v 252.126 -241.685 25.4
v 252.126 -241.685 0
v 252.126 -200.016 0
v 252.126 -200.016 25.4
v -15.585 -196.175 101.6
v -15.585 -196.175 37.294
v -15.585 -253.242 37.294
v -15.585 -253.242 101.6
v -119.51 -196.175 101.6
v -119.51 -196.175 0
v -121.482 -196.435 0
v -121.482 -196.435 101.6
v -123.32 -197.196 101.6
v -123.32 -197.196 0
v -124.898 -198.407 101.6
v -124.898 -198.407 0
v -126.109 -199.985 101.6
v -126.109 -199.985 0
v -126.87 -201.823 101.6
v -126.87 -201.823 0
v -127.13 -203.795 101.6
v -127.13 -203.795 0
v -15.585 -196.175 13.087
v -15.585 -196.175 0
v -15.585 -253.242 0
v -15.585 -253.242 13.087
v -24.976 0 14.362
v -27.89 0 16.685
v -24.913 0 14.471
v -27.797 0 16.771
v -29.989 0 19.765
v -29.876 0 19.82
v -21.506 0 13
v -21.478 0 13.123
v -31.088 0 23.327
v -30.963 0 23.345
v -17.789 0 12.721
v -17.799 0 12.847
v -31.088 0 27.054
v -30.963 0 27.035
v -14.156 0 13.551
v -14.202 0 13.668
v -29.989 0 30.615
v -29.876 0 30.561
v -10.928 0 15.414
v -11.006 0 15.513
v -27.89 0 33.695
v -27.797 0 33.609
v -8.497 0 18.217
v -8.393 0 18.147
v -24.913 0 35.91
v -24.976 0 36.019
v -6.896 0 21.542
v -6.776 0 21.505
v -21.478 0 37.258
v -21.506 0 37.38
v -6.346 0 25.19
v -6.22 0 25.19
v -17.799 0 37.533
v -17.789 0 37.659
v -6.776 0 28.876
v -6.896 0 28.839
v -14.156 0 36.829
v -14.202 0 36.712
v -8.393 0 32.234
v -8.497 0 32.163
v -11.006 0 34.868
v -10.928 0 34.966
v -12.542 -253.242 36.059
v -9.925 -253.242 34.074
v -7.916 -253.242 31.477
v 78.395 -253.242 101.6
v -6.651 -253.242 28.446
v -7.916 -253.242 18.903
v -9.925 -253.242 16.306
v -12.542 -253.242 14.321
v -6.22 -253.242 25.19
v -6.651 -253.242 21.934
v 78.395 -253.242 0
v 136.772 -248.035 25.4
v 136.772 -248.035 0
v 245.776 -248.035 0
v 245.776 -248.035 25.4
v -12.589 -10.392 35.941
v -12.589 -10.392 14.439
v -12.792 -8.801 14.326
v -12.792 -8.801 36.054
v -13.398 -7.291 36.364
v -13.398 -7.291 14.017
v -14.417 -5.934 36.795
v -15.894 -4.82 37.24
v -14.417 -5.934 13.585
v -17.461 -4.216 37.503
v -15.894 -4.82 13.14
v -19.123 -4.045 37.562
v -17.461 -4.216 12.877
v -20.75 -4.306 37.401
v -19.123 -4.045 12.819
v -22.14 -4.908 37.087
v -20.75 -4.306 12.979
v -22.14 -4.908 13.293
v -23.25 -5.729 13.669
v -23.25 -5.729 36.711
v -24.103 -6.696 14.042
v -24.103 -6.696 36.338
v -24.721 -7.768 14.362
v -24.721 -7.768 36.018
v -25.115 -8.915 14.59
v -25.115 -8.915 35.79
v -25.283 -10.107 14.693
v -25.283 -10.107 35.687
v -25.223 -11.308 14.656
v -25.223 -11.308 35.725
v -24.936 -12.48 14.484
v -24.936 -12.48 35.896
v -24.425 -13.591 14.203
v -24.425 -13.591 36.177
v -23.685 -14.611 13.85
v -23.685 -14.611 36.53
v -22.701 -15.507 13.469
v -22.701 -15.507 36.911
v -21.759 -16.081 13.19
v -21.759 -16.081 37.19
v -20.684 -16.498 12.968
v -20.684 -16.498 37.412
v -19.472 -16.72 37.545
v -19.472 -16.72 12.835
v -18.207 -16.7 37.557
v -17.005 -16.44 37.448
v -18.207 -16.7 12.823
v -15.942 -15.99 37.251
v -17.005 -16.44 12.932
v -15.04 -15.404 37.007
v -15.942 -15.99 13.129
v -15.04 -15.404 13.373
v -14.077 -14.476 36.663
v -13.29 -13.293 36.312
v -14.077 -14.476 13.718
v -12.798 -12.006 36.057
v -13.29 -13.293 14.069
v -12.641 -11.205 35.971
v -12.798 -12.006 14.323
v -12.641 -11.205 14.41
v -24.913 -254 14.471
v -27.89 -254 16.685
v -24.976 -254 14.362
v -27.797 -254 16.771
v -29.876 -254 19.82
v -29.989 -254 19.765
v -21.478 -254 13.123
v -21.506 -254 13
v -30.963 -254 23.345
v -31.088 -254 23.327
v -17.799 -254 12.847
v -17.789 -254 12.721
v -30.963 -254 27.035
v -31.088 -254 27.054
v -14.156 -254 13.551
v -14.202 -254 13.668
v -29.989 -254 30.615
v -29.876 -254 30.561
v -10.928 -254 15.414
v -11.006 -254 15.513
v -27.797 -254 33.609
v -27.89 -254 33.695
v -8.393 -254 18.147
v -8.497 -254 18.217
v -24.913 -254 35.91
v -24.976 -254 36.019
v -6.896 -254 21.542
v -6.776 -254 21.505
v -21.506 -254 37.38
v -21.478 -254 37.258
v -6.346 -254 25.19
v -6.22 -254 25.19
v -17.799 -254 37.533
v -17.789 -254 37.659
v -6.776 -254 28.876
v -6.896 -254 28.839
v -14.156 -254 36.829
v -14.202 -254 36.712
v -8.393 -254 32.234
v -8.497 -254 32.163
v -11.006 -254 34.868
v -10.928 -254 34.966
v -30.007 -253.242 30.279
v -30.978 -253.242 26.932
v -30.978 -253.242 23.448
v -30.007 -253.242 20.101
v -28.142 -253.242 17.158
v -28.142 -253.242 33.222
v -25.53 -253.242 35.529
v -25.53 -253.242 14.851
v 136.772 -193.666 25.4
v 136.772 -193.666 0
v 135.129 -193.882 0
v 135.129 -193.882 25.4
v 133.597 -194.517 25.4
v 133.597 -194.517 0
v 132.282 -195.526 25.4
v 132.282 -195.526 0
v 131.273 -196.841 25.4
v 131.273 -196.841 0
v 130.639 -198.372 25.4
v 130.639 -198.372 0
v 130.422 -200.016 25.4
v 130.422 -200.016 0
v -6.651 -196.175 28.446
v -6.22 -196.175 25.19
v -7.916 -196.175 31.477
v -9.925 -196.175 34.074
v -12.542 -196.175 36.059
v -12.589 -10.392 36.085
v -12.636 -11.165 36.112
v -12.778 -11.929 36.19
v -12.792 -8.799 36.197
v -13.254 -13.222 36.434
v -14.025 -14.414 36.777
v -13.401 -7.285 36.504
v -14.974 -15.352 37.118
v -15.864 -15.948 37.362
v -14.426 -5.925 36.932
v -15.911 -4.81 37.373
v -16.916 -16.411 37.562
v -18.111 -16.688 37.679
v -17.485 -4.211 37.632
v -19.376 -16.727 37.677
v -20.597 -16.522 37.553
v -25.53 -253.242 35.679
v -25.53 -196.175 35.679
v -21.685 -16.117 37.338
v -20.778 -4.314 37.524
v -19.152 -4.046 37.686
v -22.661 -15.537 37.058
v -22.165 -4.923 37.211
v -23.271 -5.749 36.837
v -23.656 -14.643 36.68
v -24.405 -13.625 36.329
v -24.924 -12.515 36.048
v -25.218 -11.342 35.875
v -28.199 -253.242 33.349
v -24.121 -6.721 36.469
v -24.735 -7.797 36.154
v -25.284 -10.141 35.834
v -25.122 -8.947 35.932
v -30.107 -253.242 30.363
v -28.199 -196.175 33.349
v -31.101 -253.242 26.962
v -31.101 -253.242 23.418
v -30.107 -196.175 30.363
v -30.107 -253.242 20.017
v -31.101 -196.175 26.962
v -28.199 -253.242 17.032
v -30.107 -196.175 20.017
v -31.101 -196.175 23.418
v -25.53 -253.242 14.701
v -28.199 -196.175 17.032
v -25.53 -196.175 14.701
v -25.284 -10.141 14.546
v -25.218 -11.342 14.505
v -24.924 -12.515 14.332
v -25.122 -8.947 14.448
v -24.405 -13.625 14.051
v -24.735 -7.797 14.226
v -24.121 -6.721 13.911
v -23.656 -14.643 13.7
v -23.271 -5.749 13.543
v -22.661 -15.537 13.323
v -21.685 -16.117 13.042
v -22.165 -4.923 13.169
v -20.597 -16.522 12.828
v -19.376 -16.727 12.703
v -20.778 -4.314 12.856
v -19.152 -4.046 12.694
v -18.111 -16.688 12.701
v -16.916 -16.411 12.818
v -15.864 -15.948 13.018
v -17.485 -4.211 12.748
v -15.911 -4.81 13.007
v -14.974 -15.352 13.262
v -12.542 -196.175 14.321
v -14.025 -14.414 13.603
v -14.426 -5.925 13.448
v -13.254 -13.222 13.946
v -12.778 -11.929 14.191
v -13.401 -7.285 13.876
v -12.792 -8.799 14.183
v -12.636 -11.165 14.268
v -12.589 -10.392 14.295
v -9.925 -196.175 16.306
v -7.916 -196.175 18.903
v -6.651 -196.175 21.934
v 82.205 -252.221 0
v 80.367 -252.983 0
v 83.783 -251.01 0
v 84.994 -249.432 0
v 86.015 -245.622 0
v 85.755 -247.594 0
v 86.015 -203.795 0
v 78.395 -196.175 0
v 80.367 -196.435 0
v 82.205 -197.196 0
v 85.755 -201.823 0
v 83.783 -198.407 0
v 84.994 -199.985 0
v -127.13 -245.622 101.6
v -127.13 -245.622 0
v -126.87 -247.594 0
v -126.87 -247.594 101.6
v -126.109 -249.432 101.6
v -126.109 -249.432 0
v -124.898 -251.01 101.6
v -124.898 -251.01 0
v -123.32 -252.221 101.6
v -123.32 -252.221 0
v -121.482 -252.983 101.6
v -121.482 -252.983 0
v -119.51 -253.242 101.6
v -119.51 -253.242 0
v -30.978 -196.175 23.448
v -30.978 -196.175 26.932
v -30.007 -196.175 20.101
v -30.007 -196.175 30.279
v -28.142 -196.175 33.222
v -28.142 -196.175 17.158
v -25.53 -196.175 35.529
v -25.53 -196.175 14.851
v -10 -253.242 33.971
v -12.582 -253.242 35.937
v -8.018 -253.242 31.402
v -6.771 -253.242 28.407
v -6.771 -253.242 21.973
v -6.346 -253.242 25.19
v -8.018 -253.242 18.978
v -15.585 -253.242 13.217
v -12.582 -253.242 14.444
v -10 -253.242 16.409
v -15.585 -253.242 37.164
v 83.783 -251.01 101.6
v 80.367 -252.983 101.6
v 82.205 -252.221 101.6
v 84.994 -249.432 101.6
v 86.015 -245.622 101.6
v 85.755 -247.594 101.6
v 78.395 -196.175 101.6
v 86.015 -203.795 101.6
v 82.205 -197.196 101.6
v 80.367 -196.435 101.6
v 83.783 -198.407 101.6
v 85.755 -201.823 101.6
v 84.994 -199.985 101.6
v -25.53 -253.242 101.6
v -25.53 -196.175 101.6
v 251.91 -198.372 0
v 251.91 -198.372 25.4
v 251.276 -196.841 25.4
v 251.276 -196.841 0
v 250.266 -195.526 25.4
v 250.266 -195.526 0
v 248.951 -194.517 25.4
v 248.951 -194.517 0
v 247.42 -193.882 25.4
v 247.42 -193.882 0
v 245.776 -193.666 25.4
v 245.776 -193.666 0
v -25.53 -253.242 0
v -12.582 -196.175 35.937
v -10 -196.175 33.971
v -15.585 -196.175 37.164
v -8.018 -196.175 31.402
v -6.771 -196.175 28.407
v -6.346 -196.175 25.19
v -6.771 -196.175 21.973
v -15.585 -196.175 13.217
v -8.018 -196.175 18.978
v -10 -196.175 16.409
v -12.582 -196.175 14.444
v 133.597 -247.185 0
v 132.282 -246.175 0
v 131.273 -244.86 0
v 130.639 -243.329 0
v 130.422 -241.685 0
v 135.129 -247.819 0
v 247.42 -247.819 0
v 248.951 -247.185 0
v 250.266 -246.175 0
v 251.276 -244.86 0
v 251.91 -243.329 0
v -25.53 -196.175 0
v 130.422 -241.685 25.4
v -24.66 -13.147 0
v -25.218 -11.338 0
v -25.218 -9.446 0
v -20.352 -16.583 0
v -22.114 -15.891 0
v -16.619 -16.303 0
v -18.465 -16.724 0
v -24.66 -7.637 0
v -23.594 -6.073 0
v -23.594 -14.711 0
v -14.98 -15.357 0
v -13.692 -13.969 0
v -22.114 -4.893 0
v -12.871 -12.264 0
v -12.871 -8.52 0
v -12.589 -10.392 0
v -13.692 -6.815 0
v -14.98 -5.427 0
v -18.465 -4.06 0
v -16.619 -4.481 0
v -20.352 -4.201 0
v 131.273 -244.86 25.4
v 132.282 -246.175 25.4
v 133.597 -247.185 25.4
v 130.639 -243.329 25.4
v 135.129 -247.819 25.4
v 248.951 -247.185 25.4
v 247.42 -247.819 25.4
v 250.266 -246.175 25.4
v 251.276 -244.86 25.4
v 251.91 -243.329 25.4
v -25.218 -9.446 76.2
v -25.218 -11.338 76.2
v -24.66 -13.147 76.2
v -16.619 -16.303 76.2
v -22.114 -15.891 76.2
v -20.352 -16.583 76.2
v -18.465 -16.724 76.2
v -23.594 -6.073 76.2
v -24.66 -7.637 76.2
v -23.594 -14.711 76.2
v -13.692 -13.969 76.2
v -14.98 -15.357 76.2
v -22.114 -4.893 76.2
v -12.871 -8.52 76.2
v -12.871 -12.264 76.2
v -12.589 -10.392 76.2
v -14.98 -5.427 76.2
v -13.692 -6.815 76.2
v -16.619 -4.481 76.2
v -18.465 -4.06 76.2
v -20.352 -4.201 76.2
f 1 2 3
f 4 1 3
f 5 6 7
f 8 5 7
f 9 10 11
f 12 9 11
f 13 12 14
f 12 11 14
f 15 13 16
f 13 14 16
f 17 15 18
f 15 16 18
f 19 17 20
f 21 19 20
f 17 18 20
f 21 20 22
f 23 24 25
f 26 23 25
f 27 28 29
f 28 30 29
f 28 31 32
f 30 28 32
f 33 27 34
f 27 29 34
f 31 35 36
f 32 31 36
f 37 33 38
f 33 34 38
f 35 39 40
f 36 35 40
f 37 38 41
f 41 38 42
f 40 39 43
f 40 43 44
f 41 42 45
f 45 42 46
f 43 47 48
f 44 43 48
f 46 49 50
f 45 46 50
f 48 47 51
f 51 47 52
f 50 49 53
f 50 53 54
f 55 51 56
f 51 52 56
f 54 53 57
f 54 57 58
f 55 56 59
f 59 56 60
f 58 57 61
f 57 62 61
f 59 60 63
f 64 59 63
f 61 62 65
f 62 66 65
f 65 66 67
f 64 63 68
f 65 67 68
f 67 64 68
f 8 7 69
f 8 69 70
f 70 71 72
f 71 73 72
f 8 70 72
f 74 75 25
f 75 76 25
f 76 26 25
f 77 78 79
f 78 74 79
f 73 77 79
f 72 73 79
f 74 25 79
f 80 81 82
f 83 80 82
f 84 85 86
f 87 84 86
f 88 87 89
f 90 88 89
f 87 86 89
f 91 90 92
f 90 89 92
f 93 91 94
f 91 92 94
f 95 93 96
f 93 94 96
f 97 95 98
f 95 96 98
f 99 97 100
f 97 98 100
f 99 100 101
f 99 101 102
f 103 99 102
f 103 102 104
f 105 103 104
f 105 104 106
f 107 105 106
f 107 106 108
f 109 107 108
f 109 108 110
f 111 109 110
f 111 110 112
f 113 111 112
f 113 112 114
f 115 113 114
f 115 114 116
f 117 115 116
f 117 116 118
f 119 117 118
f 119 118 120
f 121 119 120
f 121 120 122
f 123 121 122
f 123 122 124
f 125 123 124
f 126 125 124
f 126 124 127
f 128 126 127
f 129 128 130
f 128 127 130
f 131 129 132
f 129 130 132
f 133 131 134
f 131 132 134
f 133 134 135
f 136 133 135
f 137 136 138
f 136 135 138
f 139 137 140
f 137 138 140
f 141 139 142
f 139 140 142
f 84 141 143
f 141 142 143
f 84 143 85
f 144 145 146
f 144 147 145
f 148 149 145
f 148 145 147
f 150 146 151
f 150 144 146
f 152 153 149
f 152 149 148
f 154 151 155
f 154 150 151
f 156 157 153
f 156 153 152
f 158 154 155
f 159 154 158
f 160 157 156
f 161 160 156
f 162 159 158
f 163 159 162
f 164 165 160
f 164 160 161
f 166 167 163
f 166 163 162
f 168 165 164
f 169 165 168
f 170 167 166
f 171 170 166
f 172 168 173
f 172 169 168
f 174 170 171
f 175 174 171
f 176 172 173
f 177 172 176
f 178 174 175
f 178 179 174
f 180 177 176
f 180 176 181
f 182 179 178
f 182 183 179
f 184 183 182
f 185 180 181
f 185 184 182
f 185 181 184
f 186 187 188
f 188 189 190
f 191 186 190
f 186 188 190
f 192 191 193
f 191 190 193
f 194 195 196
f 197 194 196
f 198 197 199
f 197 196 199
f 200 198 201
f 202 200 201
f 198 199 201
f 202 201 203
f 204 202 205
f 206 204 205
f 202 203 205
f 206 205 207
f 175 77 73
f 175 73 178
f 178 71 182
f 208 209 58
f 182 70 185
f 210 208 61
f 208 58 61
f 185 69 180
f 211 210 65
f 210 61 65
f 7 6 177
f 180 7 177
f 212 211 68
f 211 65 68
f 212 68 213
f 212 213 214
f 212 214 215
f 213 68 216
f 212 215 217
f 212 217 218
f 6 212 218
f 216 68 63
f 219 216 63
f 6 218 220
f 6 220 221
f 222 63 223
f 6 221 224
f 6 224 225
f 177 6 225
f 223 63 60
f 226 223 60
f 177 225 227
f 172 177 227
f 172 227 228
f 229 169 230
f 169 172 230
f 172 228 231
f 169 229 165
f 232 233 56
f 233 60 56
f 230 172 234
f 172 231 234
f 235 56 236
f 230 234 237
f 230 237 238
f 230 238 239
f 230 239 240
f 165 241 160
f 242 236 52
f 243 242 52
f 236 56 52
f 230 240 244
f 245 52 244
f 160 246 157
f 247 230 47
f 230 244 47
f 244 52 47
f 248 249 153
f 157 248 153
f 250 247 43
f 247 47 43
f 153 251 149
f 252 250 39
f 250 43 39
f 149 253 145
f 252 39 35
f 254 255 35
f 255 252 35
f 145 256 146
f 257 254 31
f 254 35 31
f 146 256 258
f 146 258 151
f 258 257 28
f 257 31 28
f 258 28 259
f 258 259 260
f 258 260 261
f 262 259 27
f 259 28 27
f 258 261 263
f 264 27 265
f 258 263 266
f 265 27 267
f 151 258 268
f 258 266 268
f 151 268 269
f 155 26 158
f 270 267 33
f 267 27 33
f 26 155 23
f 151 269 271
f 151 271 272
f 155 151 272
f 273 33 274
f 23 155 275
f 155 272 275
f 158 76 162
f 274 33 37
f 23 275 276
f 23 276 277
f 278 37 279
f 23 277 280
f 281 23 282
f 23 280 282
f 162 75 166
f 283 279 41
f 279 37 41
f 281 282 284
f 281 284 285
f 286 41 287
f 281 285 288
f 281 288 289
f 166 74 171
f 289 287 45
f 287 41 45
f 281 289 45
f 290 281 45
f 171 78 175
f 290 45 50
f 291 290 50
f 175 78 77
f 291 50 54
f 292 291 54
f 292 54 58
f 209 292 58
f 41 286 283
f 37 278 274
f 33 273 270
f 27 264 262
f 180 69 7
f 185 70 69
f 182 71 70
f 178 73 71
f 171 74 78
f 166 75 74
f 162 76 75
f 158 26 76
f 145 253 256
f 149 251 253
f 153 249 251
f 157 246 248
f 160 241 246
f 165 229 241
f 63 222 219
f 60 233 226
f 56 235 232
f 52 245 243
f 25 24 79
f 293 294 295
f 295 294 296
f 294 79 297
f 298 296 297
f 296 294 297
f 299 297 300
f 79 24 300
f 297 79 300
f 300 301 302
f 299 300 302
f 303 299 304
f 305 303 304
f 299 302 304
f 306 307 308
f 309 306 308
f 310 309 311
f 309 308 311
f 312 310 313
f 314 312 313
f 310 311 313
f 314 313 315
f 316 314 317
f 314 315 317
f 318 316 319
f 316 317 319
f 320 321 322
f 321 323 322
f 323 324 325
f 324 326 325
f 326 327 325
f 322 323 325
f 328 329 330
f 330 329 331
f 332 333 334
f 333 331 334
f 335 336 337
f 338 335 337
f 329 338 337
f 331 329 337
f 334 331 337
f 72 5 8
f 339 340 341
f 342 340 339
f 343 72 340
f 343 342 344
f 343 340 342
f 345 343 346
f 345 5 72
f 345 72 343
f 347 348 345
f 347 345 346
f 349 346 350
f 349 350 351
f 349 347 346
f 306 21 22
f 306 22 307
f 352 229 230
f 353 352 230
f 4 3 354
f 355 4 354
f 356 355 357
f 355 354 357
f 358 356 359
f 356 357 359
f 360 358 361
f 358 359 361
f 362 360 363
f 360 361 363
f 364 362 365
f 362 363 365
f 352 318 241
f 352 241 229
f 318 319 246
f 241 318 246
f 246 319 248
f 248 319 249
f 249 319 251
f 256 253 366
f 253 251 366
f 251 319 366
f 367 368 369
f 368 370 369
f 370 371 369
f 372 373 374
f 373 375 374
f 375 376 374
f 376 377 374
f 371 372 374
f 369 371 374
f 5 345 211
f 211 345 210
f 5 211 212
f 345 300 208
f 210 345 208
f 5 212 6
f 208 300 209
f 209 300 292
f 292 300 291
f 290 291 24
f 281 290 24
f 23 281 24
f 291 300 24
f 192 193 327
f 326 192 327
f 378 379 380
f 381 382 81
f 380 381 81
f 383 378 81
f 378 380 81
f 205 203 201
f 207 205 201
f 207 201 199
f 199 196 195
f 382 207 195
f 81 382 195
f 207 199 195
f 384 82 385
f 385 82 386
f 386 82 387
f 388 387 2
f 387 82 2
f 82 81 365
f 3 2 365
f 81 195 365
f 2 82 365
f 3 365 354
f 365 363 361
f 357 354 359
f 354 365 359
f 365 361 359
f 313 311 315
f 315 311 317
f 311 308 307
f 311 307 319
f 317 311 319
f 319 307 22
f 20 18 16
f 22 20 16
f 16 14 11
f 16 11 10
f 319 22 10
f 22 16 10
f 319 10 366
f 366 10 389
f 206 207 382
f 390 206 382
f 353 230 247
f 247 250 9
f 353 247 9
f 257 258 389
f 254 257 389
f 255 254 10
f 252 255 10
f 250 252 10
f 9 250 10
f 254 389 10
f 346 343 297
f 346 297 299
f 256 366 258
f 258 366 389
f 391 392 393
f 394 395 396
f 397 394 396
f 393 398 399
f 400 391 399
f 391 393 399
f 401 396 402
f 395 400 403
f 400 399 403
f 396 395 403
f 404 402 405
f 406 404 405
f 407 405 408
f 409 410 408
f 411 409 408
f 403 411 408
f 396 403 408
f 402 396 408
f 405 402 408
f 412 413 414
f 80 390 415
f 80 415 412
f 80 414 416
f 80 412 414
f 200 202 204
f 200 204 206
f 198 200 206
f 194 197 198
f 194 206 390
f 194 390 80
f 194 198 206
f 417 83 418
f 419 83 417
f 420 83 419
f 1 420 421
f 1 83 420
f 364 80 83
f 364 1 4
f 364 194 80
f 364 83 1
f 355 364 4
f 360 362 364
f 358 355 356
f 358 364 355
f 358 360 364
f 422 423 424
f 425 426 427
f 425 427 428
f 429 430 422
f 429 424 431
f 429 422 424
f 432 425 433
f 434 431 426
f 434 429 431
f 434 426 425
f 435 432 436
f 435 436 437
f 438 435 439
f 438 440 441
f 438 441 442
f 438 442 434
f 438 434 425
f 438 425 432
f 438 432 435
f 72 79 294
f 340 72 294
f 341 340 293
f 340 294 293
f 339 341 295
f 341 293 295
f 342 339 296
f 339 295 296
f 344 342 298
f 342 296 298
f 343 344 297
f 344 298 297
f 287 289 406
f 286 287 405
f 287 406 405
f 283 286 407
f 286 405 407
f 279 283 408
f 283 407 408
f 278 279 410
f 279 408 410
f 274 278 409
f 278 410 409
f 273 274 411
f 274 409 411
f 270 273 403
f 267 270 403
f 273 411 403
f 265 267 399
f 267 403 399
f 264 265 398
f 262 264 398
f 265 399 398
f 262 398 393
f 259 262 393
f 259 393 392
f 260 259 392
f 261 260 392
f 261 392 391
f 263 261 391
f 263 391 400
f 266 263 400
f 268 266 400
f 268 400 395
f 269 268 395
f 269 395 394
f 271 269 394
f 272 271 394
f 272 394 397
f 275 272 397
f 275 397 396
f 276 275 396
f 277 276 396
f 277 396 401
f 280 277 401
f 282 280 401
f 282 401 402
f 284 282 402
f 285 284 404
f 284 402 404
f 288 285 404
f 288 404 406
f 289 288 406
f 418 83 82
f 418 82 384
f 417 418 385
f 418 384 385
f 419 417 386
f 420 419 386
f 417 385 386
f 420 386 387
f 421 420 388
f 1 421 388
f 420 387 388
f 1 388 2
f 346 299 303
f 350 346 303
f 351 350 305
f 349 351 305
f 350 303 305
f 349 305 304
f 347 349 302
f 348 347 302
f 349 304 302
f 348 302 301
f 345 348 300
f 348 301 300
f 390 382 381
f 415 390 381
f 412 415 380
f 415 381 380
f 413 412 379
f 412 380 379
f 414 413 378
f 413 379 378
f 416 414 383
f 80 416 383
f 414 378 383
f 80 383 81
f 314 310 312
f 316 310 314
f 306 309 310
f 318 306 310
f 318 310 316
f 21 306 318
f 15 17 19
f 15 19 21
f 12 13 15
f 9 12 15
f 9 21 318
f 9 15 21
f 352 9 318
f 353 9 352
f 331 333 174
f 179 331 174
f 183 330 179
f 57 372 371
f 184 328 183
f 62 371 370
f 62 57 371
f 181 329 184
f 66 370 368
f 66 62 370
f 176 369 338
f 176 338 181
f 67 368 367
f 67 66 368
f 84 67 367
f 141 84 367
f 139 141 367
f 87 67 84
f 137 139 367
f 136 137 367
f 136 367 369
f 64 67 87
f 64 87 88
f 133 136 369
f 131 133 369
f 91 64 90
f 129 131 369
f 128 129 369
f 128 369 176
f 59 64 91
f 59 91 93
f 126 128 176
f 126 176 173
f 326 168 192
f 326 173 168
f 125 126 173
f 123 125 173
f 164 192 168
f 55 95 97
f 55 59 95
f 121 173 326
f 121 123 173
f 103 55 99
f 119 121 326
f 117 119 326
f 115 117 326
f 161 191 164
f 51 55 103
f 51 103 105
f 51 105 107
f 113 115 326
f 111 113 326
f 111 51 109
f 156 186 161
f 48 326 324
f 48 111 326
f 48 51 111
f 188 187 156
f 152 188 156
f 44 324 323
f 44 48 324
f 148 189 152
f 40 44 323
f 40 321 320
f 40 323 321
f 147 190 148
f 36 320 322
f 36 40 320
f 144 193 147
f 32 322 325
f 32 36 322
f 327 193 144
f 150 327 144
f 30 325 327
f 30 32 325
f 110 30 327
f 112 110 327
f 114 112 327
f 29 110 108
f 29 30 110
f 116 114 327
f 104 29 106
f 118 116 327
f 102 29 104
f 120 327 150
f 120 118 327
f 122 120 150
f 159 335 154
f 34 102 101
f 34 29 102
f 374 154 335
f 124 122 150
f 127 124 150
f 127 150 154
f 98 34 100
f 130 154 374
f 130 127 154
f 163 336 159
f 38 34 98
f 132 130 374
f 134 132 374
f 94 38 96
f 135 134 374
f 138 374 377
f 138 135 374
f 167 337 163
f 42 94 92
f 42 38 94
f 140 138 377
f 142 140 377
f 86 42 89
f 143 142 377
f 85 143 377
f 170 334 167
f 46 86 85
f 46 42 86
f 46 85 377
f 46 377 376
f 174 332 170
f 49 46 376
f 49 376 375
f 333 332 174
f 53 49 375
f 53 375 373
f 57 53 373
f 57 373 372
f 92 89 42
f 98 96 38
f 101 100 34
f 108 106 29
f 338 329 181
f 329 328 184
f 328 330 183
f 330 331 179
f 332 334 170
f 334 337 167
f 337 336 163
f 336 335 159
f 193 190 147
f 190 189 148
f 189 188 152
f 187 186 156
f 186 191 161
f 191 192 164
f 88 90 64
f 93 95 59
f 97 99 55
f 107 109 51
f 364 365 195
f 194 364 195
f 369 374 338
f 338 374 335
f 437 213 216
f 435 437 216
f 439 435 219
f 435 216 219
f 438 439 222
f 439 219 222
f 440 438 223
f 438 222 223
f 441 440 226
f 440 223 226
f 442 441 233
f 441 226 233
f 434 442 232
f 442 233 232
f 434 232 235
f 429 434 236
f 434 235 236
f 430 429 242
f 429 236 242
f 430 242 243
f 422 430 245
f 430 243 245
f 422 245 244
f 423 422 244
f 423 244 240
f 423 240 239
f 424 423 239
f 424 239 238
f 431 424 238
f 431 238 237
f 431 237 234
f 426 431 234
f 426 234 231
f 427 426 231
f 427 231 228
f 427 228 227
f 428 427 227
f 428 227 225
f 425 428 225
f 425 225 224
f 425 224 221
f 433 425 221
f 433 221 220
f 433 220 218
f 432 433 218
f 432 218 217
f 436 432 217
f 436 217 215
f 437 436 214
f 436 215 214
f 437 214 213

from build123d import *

# Parameters (mm, degrees)
F0_R     = 12.5036687166
F0_R_2   = 12.3778800523
F1_DEPTH = 254
F3_DEPTH = 101.6
F4_R     = 6.35
F5_DEPTH = 76.2
F6_W     = 25.5638659
F6_H     = 27.1847397089
F7_DEPTH = 25.4


with BuildPart() as f1:
    # F0 (on Front) → F1 (new body)
    with BuildSketch(Plane.XZ):
        with Locations((-18.7236908823, 25.1901205629)):
            Circle(F0_R)
        with Locations((-18.7236908823, 25.1901205629)):
            Circle(F0_R_2, mode=Mode.SUBTRACT)
    extrude(amount=F1_DEPTH)

    # F2 (on Top) → F3 (join)
    with BuildSketch(Plane.XY):
        with BuildLine():
            Line((-25.5296746087, -253.2422840595), (-25.5296746087, -196.175172925))
            Line((-25.5296746087, -196.175172925), (-119.5096746087, -196.175172925))
            ThreePointArc((-119.5096746087, -196.175172925), (-124.8978282813, -198.4070192524), (-127.1296746087, -203.795172925))
            Line((-127.1296746087, -203.795172925), (-127.1296746087, -245.6222840595))
            ThreePointArc((-127.1296746087, -245.6222840595), (-124.8978282813, -251.0104377322), (-119.5096746087, -253.2422840595))
            Line((-119.5096746087, -253.2422840595), (-25.5296746087, -253.2422840595))
        make_face()
        with BuildLine():
            Line((-15.5854386449, -253.2422840595), (78.3945613551, -253.2422840595))
            ThreePointArc((78.3945613551, -253.2422840595), (83.7827150278, -251.0104377322), (86.0145613551, -245.6222840595))
            Line((86.0145613551, -245.6222840595), (86.0145613551, -203.795172925))
            ThreePointArc((86.0145613551, -203.795172925), (83.7827150278, -198.4070192524), (78.3945613551, -196.175172925))
            Line((78.3945613551, -196.175172925), (-15.5854386449, -196.175172925))
            Line((-15.5854386449, -196.175172925), (-15.5854386449, -253.2422840595))
        make_face()
    extrude(amount=F3_DEPTH)

    # F4 (on Top) → F5 (join)
    with BuildSketch(Plane.XY):
        with Locations((-18.9391057938, -10.3919953108)):
            Circle(F4_R)
    extrude(amount=F5_DEPTH)


with BuildPart() as f7:
    # F6 (on Top) → F7 (new body)
    with BuildSketch(Plane.XY):
        with BuildLine():
            Line((153.9690494537, -193.66581738), (136.772309041, -193.66581738))
            ThreePointArc((136.772309041, -193.66581738), (132.2821809805, -195.5256893194), (130.422309041, -200.01581738))
            Line((130.422309041, -200.01581738), (130.422309041, -220.8505570889))
            Line((130.422309041, -220.8505570889), (153.9690494537, -220.8505570889))
            Line((153.9690494537, -220.8505570889), (153.9690494537, -193.66581738))
        make_face()
        with BuildLine():
            Line((153.9690494537, -248.0352967978), (153.9690494537, -220.8505570889))
            Line((153.9690494537, -220.8505570889), (130.422309041, -220.8505570889))
            Line((130.422309041, -220.8505570889), (130.422309041, -241.6852967978))
            ThreePointArc((130.422309041, -241.6852967978), (132.2821809805, -246.1754248583), (136.772309041, -248.0352967978))
            Line((136.772309041, -248.0352967978), (153.9690494537, -248.0352967978))
        make_face()
        with BuildLine():
            Line((252.1263062954, -220.8505570889), (229.848954941, -220.8505570889))
            Line((229.848954941, -220.8505570889), (229.8617810011, -248.0352967978))
            Line((229.8617810011, -248.0352967978), (245.7763062954, -248.0352967978))
            ThreePointArc((245.7763062954, -248.0352967978), (250.2664343559, -246.1754248583), (252.1263062954, -241.6852967978))
            Line((252.1263062954, -241.6852967978), (252.1263062954, -220.8505570889))
        make_face()
        with Locations((166.7509824038, -207.2581872344)):
            Rectangle(F6_W, F6_H)
        Polygon((204.6531507446, -193.66581738), (179.5329153538, -193.66581738), (179.5329153538, -220.8505570889), (204.6582548496, -220.8505570889), align=None)
        with Locations((166.7509824038, -234.4429269433)):
            Rectangle(F6_W, F6_H)
        Polygon((204.6582548496, -220.8505570889), (179.5329153538, -220.8505570889), (179.5329153538, -248.0352967978), (204.6633589546, -248.0352967978), align=None)
        Polygon((229.848954941, -220.8505570889), (204.6582548496, -220.8505570889), (204.6633589546, -248.0352967978), (229.8617810011, -248.0352967978), align=None)
        Polygon((229.836128881, -193.66581738), (204.6531507446, -193.66581738), (204.6582548496, -220.8505570889), (229.848954941, -220.8505570889), align=None)
        with BuildLine():
            Line((245.7763062954, -193.66581738), (229.836128881, -193.66581738))
            Line((229.836128881, -193.66581738), (229.848954941, -220.8505570889))
            Line((229.848954941, -220.8505570889), (252.1263062954, -220.8505570889))
            Line((252.1263062954, -220.8505570889), (252.1263062954, -200.01581738))
            ThreePointArc((252.1263062954, -200.01581738), (250.2664343559, -195.5256893194), (245.7763062954, -193.66581738))
        make_face()
    extrude(amount=F7_DEPTH)


solid = Compound([f1.part, f7.part])
